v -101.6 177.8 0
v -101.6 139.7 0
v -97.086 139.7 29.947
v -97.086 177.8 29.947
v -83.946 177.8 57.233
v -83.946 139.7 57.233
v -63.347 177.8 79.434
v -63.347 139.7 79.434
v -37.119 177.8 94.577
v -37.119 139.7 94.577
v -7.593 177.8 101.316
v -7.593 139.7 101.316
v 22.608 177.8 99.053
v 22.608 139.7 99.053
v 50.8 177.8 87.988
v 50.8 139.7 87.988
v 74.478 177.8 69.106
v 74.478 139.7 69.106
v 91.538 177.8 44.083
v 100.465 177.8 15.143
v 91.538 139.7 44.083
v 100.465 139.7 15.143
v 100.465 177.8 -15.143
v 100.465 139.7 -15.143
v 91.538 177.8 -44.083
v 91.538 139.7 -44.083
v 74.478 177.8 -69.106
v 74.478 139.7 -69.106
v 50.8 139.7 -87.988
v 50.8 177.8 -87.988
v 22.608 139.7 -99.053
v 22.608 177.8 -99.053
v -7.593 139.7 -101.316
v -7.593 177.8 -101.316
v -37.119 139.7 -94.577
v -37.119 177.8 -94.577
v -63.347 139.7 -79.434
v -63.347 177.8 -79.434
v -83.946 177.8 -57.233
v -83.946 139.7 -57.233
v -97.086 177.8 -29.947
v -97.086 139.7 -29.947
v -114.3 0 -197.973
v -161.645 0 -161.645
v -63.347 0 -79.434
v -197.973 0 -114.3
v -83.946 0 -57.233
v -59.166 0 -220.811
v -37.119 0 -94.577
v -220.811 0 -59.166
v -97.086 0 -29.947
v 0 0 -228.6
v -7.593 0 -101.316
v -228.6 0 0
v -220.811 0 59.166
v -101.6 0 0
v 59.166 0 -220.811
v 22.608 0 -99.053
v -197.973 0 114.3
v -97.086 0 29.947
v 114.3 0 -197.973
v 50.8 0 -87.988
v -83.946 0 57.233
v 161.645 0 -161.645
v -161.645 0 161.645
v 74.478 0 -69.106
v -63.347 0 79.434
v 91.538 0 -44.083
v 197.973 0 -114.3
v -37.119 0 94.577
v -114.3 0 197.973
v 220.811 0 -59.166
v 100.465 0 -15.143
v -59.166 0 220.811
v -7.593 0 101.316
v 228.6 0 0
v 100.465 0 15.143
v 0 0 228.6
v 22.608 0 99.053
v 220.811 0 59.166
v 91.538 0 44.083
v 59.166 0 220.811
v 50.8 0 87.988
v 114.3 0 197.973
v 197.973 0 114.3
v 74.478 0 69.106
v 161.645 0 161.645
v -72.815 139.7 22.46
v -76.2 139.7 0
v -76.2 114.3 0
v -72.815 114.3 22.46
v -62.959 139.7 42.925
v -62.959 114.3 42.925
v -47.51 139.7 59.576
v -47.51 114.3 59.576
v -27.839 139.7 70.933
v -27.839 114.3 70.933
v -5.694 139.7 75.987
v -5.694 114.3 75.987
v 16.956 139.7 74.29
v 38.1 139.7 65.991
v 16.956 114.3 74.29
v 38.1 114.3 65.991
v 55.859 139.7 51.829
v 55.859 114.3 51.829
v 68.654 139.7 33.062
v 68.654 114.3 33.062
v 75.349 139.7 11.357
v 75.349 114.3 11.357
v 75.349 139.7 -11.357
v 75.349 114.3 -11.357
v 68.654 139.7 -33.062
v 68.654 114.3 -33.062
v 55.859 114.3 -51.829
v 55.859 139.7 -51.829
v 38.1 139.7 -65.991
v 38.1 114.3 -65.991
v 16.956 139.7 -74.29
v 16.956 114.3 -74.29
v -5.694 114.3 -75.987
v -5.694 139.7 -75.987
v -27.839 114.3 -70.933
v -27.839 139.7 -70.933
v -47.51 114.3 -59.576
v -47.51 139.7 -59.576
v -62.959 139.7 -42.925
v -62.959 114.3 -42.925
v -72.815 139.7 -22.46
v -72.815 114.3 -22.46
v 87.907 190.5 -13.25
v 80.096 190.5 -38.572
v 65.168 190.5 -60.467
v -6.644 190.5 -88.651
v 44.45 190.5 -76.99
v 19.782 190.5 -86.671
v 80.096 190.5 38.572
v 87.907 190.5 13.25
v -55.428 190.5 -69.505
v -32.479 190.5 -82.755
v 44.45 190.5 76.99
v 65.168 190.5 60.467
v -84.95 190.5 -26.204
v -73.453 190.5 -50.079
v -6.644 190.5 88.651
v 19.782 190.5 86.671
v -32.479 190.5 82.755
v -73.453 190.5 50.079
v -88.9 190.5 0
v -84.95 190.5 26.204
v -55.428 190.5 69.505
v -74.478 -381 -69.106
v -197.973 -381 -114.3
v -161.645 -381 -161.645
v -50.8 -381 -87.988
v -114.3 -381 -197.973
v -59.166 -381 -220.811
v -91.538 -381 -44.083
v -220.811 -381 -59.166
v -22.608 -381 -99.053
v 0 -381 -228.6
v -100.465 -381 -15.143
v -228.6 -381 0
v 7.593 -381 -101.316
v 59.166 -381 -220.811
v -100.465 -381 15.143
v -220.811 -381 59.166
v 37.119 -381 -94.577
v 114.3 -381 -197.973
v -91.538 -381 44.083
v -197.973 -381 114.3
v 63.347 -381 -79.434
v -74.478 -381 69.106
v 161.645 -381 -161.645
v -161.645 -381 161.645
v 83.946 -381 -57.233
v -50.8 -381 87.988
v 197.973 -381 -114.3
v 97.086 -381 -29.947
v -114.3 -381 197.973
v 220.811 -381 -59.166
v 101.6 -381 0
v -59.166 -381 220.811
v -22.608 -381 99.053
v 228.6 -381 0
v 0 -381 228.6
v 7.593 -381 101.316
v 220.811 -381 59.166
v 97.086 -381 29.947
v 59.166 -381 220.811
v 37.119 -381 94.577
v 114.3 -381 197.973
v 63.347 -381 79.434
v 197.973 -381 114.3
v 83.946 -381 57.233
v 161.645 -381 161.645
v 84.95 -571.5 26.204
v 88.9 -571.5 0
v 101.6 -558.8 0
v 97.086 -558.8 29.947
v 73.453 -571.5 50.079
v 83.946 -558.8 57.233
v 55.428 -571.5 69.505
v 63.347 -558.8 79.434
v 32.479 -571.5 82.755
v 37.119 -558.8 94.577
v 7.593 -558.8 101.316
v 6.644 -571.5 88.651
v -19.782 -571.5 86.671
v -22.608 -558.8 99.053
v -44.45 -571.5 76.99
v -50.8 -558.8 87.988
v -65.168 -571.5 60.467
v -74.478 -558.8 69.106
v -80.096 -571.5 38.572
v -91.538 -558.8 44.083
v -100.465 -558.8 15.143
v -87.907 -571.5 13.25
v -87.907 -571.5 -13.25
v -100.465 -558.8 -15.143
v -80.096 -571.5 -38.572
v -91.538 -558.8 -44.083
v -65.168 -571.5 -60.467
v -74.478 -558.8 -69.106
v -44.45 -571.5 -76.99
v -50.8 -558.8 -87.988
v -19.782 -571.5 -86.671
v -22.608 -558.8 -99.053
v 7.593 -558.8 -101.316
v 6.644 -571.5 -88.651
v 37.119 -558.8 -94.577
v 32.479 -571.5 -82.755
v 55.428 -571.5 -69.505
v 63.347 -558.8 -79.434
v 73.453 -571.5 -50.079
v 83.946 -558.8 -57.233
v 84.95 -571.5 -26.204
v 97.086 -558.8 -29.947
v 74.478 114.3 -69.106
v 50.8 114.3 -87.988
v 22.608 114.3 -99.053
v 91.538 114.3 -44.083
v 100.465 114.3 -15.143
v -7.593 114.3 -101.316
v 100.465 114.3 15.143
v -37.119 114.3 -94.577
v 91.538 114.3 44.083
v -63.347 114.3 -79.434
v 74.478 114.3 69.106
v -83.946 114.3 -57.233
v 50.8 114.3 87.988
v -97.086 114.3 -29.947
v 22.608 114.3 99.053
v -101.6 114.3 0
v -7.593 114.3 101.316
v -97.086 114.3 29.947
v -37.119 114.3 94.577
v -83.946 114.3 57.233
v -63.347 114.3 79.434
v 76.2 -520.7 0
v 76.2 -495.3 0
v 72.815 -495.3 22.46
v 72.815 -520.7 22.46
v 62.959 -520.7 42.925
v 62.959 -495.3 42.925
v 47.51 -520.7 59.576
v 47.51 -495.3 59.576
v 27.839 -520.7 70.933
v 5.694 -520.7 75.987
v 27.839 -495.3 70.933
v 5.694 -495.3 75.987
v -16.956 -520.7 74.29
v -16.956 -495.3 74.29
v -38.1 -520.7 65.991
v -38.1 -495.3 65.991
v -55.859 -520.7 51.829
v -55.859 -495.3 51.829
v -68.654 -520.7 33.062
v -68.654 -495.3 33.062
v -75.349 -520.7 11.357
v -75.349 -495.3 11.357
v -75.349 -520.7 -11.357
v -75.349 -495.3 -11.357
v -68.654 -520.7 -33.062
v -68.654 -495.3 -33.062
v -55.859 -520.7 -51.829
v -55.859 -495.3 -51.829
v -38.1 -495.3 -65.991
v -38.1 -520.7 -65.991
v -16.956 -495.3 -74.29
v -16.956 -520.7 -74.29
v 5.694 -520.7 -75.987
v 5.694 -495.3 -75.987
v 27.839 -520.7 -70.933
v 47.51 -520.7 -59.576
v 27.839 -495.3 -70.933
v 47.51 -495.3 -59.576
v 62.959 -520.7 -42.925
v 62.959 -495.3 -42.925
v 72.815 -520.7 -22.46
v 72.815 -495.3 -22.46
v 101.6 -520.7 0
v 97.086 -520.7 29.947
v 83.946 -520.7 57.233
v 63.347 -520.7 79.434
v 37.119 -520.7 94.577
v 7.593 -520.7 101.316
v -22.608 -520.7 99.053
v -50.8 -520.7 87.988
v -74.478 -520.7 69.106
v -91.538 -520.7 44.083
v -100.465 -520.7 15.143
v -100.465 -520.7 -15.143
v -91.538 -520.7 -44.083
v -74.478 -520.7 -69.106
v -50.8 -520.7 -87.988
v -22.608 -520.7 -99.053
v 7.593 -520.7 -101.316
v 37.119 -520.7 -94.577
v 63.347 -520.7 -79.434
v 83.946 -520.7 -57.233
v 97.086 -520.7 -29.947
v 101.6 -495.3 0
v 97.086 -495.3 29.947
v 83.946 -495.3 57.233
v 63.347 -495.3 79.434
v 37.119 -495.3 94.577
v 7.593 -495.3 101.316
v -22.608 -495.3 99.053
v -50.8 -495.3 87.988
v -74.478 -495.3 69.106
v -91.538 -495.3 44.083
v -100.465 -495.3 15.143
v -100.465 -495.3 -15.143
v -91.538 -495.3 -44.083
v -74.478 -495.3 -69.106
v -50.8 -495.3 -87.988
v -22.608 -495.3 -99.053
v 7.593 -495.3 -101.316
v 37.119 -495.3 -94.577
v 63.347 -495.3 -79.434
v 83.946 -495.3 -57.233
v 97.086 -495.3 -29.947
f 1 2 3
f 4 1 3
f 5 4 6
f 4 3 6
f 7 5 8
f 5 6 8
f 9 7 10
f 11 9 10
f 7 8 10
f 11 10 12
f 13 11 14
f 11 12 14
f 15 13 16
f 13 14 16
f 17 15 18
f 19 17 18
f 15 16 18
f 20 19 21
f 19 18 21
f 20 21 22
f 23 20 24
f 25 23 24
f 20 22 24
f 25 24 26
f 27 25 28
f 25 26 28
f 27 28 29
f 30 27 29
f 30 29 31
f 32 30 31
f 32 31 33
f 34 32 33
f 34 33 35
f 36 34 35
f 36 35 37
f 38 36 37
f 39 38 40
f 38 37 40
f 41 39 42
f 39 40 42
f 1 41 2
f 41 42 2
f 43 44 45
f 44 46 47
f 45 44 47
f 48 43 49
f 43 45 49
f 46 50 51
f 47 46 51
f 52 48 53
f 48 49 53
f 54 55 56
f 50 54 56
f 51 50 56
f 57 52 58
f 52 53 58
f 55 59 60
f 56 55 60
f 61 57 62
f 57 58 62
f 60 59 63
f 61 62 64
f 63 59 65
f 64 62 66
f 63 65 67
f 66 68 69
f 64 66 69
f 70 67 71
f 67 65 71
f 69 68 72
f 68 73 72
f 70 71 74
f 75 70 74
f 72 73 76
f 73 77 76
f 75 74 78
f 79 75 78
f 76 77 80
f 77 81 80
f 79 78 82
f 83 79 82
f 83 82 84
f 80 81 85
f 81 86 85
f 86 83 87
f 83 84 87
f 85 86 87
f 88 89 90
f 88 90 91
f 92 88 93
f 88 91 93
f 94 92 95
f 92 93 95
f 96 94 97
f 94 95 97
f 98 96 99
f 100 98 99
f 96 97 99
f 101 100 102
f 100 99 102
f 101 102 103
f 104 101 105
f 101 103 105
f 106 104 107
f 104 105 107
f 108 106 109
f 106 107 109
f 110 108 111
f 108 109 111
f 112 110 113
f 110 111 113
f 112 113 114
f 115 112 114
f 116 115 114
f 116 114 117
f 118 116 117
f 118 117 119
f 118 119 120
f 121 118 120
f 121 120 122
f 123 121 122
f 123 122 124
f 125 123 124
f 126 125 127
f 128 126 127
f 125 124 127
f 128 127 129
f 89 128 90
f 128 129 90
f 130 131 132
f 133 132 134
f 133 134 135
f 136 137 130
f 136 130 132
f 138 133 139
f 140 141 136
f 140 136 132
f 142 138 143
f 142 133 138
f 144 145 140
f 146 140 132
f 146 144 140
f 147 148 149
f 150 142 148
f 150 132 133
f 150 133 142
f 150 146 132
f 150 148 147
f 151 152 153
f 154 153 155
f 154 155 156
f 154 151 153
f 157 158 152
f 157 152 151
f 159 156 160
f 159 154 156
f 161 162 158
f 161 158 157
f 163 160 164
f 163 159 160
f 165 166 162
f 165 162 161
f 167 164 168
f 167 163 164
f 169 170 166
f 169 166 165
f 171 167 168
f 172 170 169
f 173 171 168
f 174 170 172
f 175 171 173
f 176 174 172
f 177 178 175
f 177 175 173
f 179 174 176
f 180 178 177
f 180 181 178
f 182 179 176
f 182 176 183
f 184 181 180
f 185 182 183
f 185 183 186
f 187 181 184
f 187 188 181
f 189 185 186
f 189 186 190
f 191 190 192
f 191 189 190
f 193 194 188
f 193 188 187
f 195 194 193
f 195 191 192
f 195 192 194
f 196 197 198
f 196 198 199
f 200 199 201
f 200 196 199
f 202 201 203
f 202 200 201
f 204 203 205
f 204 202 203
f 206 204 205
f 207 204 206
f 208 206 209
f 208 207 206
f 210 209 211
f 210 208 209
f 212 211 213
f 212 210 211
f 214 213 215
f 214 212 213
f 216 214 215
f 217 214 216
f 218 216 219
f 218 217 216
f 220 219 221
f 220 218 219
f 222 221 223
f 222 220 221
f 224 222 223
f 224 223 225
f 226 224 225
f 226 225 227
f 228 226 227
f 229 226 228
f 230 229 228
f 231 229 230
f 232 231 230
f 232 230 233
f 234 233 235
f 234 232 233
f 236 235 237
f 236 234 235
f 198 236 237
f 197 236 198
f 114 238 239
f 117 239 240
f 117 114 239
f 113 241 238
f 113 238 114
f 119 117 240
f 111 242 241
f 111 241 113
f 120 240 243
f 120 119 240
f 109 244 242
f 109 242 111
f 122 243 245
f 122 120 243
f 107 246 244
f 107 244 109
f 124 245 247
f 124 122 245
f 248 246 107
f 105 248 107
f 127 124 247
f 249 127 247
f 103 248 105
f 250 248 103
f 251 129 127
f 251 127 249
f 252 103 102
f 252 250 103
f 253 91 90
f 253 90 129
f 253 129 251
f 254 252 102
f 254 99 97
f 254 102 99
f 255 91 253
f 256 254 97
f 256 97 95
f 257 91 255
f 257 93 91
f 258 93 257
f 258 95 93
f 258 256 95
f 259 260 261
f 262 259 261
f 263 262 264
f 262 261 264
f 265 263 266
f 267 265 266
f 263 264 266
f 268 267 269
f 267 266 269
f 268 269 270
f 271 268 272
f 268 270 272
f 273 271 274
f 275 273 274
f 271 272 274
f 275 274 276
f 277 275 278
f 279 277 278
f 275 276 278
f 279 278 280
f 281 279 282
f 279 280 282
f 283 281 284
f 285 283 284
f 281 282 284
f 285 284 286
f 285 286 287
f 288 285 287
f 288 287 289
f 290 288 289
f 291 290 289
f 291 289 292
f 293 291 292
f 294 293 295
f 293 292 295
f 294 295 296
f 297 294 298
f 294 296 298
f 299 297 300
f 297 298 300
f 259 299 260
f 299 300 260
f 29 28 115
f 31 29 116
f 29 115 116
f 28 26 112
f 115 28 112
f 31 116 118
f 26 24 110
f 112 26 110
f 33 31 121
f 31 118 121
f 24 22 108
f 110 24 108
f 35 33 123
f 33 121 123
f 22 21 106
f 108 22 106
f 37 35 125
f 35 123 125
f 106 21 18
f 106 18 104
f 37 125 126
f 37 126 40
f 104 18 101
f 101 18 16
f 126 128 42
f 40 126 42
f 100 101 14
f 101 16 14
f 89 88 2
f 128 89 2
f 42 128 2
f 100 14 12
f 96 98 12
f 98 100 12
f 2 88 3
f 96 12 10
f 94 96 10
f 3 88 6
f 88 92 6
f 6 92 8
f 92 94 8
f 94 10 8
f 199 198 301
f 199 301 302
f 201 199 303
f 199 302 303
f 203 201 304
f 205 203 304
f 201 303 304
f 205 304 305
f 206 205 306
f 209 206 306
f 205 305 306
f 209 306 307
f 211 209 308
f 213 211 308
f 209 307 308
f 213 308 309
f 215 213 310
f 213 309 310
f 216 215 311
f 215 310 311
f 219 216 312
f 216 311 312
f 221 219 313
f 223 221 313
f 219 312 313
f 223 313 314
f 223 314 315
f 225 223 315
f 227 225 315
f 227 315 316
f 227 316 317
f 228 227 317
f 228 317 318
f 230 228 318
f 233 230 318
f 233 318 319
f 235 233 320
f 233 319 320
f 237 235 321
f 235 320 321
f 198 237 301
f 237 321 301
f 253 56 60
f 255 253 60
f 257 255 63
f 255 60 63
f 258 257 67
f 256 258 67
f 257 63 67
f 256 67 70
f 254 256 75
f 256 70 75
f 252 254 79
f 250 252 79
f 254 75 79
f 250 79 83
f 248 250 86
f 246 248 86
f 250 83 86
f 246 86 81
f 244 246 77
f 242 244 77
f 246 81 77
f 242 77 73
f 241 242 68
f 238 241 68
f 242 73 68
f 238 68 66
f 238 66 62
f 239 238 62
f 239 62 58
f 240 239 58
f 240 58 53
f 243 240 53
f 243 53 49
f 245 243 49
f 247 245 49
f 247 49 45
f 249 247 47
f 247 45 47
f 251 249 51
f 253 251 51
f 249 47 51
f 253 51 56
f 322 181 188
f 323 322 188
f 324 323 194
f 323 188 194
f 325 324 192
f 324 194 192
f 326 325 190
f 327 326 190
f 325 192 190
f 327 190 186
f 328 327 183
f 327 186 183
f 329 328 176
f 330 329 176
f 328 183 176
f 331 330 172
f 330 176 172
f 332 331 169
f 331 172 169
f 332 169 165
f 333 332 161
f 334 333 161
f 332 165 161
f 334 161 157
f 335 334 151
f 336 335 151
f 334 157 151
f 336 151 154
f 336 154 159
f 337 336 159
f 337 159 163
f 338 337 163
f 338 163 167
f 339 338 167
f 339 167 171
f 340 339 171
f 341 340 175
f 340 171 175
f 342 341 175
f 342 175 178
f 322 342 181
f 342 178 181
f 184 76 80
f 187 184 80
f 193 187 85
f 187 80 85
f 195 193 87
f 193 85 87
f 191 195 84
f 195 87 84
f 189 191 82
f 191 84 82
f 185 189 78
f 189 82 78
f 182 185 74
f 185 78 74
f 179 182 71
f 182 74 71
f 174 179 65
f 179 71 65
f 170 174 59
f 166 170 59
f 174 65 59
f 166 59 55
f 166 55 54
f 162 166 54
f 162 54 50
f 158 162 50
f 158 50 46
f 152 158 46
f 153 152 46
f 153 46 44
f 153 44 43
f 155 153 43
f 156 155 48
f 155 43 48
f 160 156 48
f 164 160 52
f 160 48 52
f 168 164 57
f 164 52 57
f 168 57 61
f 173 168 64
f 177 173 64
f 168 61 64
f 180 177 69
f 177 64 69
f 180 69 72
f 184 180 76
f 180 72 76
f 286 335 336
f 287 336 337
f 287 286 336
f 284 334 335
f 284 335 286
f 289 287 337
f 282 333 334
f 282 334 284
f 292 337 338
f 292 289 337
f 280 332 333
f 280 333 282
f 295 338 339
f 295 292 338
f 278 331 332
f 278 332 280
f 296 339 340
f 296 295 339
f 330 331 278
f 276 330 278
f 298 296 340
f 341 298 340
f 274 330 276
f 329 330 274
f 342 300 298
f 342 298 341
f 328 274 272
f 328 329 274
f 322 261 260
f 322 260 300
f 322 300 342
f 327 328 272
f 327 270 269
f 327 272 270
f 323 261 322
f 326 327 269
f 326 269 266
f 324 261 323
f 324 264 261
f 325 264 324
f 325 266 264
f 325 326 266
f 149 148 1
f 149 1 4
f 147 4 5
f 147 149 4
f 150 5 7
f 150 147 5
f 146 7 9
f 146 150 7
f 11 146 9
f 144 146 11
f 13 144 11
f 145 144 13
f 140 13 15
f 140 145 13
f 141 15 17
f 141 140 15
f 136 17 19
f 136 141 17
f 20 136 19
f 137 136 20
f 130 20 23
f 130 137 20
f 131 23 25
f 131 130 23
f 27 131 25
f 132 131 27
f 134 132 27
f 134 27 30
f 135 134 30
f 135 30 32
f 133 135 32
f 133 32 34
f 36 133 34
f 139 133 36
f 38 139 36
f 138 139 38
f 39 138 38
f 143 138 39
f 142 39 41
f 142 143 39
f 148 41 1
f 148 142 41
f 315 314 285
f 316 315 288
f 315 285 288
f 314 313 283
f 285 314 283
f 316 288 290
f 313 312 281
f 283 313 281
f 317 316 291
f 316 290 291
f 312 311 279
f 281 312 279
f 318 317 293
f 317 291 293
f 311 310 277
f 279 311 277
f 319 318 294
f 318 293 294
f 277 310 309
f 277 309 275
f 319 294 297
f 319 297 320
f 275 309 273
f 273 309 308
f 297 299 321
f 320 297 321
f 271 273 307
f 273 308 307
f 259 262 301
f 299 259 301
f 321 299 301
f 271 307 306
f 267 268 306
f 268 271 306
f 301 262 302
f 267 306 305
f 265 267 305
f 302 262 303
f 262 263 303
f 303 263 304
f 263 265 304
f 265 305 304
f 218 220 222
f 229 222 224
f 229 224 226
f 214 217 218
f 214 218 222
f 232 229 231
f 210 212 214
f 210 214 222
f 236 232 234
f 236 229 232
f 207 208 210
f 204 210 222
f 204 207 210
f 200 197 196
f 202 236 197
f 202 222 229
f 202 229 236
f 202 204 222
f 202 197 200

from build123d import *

# Parameters (mm, degrees)
F0_R      = 228.6
F1_DEPTH  = 381
F2_R      = 101.6
F3_DEPTH  = 114.3
F4_R      = 101.6
F3_FACE_R = 101.6
F5_DEPTH  = 114.3
F6_R      = 76.2
F7_DEPTH  = 25.4
F8_R      = 101.6
F9_DEPTH  = 50.8
F10_R     = 76.2
F11_DEPTH = 25.4
F12_R     = 101.6
F13_DEPTH = 50.8
F14_SIZE2 = 12.7
F14_SIZE  = 12.7


with BuildPart() as f1:
    # F0 (on Front) → F1 (new body)
    with BuildSketch(Plane.XZ):
        Circle(F0_R)
    extrude(amount=F1_DEPTH)

    # F2 (on face) → F3 (join)
    with BuildSketch(Plane.XZ.offset(381)):
        Circle(F2_R)
    extrude(amount=F3_DEPTH)

    # F4 (on face) + F3_face (on face) → F5 (join)
    with BuildSketch(Plane(origin=(0, 0, 0), x_dir=(-1, 0, 0), z_dir=(0, 1, 0))):
        Circle(F4_R)
    with BuildSketch(Plane.XZ.offset(495.3)):
        Circle(F3_FACE_R)
    extrude(amount=F5_DEPTH, dir=(0, 1, 0))

    # F6 (on face) → F7 (join)
    with BuildSketch(Plane(origin=(0, 114.3, 0), x_dir=(-1, 0, 0), z_dir=(0, 1, 0))):
        Circle(F6_R)
    extrude(amount=F7_DEPTH)

    # F8 (on face) → F9 (join)
    with BuildSketch(Plane(origin=(0, 139.7, 0), x_dir=(-1, 0, 0), z_dir=(0, 1, 0))):
        Circle(F8_R)
    extrude(amount=F9_DEPTH)

    # F10 (on face) → F11 (join)
    with BuildSketch(Plane.XZ.offset(495.3)):
        Circle(F10_R)
    extrude(amount=F11_DEPTH)

    # F12 (on face) → F13 (join)
    with BuildSketch(Plane.XZ.offset(520.7)):
        Circle(F12_R)
    extrude(amount=F13_DEPTH)

    # F14
    f14_edges = [f1.edges().sort_by_distance(p)[0] for p in [
        (101.6, 190.5, 0),
        (-101.6, -571.5, 0),
    ]]
    chamfer(f14_edges, length=F14_SIZE, length2=F14_SIZE2)


solid = f1.part
